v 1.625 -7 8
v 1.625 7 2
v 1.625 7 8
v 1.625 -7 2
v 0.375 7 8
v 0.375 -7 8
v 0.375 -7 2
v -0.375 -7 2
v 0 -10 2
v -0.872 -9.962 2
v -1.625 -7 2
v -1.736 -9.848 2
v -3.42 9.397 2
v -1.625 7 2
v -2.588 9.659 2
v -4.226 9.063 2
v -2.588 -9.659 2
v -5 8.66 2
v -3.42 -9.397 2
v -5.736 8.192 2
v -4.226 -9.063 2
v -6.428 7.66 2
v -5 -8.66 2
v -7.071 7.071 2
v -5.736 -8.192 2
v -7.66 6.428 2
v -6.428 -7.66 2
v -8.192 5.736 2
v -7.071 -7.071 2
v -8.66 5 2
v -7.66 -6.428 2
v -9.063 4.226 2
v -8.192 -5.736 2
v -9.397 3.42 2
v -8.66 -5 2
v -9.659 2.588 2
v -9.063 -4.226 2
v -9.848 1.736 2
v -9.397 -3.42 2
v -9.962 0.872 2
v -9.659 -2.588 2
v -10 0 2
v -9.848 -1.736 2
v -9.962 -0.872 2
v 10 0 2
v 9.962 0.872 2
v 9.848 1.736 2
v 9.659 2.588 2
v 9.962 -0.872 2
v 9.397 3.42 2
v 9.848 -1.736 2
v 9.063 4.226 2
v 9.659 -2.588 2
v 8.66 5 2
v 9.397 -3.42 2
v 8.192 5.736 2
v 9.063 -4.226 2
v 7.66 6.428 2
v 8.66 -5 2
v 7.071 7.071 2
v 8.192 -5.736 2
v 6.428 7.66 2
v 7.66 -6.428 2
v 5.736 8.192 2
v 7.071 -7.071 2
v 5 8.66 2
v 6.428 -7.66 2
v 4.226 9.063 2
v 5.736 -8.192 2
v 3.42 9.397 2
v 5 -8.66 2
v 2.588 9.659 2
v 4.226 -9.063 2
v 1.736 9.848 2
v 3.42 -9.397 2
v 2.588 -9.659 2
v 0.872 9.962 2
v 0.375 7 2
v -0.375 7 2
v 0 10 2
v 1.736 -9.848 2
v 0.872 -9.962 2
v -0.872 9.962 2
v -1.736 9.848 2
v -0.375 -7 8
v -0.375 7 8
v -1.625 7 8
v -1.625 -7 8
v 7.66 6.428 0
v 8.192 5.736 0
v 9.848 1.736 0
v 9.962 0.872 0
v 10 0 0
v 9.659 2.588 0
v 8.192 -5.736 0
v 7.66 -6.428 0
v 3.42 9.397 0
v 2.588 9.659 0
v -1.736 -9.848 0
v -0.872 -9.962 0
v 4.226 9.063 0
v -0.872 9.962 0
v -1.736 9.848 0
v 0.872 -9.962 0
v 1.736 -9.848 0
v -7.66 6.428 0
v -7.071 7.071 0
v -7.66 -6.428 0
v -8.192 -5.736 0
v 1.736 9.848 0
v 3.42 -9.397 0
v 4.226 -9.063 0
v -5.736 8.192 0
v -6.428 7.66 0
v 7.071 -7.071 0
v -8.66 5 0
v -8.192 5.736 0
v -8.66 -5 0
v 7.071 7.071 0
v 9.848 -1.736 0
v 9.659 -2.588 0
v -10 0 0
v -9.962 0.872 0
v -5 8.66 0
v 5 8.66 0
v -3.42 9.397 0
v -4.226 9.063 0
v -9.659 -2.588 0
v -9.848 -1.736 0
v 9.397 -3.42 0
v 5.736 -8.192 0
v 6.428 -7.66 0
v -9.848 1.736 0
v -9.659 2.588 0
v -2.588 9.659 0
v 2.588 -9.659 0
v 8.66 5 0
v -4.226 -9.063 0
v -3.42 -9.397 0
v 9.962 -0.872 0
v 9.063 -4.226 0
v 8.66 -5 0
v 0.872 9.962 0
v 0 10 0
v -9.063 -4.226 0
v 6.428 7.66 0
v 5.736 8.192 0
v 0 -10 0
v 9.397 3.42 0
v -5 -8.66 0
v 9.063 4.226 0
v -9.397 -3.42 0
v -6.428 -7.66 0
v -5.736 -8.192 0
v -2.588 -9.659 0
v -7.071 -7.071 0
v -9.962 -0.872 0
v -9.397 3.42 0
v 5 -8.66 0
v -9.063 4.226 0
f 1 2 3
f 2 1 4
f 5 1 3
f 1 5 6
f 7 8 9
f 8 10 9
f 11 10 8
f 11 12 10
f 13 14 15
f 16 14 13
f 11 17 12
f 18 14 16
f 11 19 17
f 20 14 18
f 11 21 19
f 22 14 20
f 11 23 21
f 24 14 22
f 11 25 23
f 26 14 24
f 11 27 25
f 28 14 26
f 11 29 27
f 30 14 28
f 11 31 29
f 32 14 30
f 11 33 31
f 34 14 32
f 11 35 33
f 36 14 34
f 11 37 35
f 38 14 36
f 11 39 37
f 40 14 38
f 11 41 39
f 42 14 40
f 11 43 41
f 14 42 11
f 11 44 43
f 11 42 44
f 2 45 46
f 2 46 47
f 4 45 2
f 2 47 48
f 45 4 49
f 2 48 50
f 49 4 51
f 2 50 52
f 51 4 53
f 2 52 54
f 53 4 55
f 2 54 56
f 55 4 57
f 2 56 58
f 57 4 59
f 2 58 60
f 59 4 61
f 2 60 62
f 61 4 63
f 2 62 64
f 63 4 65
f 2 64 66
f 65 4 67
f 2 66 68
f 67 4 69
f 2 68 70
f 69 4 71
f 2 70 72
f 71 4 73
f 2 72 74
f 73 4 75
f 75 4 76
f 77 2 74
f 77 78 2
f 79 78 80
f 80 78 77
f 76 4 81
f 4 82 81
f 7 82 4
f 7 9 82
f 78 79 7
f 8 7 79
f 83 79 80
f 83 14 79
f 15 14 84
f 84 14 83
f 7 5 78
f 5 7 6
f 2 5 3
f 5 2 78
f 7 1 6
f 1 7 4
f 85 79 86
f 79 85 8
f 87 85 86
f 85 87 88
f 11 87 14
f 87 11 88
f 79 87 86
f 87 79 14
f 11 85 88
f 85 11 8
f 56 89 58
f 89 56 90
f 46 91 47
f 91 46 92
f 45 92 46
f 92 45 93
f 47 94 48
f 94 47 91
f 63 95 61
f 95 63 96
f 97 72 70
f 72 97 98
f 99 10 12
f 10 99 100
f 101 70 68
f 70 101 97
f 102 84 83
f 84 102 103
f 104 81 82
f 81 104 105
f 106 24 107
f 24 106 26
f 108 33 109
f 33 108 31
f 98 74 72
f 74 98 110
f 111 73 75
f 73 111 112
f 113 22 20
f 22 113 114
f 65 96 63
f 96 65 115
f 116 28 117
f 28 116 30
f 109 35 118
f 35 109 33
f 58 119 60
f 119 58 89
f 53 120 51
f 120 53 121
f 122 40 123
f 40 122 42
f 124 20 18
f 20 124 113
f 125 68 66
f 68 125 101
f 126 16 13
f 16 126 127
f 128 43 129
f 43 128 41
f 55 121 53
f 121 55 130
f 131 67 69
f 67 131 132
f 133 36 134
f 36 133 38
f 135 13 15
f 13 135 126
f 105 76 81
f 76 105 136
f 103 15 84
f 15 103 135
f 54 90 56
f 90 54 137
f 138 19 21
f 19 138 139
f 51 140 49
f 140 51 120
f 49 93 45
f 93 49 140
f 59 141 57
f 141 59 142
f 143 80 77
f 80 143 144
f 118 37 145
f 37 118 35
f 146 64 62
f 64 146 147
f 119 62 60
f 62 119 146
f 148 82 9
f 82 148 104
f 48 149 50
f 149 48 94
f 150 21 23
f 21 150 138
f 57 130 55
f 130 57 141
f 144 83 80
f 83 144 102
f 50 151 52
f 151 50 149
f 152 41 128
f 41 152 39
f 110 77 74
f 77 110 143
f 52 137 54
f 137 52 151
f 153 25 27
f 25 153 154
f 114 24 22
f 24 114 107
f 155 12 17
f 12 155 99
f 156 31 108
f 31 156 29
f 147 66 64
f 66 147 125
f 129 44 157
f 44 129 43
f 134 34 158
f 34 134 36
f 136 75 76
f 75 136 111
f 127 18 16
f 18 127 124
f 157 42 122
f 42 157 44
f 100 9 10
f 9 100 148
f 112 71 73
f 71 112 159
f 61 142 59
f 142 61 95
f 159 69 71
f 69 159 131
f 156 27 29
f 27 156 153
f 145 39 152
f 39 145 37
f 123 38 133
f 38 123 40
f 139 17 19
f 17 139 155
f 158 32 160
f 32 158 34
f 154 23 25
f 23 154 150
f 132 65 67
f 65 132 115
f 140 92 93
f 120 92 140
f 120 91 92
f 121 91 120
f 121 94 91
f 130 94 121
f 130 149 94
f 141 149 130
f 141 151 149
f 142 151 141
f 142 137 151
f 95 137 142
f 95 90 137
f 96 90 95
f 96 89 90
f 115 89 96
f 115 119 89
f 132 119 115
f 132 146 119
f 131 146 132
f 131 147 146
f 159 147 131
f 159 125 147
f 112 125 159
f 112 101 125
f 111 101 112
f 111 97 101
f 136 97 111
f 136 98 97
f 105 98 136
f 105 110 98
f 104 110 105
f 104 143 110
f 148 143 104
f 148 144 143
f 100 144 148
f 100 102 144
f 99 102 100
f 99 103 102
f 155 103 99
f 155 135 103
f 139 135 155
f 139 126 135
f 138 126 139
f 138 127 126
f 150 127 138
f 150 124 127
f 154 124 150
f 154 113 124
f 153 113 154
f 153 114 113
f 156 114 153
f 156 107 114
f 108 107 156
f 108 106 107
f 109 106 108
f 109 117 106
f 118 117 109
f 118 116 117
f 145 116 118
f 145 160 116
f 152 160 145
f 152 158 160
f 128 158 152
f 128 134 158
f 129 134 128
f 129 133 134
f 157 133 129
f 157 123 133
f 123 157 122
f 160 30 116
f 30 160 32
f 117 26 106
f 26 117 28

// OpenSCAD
$fn = 72;

t = 2;
holder_x = 1.25;
holder_y = 14;
holder_z = 6;
distance = 0.75;

cylinder(2, 10, 10);

module holder() {
    union() {
        translate([(holder_x+distance)/2, 0, 0]) cube([holder_x, holder_y, holder_z], true);
        translate([-(holder_x+distance)/2, 0, 0]) cube([holder_x, holder_y, holder_z], true);
        }
}

translate([0, 0, t+3]) holder();
